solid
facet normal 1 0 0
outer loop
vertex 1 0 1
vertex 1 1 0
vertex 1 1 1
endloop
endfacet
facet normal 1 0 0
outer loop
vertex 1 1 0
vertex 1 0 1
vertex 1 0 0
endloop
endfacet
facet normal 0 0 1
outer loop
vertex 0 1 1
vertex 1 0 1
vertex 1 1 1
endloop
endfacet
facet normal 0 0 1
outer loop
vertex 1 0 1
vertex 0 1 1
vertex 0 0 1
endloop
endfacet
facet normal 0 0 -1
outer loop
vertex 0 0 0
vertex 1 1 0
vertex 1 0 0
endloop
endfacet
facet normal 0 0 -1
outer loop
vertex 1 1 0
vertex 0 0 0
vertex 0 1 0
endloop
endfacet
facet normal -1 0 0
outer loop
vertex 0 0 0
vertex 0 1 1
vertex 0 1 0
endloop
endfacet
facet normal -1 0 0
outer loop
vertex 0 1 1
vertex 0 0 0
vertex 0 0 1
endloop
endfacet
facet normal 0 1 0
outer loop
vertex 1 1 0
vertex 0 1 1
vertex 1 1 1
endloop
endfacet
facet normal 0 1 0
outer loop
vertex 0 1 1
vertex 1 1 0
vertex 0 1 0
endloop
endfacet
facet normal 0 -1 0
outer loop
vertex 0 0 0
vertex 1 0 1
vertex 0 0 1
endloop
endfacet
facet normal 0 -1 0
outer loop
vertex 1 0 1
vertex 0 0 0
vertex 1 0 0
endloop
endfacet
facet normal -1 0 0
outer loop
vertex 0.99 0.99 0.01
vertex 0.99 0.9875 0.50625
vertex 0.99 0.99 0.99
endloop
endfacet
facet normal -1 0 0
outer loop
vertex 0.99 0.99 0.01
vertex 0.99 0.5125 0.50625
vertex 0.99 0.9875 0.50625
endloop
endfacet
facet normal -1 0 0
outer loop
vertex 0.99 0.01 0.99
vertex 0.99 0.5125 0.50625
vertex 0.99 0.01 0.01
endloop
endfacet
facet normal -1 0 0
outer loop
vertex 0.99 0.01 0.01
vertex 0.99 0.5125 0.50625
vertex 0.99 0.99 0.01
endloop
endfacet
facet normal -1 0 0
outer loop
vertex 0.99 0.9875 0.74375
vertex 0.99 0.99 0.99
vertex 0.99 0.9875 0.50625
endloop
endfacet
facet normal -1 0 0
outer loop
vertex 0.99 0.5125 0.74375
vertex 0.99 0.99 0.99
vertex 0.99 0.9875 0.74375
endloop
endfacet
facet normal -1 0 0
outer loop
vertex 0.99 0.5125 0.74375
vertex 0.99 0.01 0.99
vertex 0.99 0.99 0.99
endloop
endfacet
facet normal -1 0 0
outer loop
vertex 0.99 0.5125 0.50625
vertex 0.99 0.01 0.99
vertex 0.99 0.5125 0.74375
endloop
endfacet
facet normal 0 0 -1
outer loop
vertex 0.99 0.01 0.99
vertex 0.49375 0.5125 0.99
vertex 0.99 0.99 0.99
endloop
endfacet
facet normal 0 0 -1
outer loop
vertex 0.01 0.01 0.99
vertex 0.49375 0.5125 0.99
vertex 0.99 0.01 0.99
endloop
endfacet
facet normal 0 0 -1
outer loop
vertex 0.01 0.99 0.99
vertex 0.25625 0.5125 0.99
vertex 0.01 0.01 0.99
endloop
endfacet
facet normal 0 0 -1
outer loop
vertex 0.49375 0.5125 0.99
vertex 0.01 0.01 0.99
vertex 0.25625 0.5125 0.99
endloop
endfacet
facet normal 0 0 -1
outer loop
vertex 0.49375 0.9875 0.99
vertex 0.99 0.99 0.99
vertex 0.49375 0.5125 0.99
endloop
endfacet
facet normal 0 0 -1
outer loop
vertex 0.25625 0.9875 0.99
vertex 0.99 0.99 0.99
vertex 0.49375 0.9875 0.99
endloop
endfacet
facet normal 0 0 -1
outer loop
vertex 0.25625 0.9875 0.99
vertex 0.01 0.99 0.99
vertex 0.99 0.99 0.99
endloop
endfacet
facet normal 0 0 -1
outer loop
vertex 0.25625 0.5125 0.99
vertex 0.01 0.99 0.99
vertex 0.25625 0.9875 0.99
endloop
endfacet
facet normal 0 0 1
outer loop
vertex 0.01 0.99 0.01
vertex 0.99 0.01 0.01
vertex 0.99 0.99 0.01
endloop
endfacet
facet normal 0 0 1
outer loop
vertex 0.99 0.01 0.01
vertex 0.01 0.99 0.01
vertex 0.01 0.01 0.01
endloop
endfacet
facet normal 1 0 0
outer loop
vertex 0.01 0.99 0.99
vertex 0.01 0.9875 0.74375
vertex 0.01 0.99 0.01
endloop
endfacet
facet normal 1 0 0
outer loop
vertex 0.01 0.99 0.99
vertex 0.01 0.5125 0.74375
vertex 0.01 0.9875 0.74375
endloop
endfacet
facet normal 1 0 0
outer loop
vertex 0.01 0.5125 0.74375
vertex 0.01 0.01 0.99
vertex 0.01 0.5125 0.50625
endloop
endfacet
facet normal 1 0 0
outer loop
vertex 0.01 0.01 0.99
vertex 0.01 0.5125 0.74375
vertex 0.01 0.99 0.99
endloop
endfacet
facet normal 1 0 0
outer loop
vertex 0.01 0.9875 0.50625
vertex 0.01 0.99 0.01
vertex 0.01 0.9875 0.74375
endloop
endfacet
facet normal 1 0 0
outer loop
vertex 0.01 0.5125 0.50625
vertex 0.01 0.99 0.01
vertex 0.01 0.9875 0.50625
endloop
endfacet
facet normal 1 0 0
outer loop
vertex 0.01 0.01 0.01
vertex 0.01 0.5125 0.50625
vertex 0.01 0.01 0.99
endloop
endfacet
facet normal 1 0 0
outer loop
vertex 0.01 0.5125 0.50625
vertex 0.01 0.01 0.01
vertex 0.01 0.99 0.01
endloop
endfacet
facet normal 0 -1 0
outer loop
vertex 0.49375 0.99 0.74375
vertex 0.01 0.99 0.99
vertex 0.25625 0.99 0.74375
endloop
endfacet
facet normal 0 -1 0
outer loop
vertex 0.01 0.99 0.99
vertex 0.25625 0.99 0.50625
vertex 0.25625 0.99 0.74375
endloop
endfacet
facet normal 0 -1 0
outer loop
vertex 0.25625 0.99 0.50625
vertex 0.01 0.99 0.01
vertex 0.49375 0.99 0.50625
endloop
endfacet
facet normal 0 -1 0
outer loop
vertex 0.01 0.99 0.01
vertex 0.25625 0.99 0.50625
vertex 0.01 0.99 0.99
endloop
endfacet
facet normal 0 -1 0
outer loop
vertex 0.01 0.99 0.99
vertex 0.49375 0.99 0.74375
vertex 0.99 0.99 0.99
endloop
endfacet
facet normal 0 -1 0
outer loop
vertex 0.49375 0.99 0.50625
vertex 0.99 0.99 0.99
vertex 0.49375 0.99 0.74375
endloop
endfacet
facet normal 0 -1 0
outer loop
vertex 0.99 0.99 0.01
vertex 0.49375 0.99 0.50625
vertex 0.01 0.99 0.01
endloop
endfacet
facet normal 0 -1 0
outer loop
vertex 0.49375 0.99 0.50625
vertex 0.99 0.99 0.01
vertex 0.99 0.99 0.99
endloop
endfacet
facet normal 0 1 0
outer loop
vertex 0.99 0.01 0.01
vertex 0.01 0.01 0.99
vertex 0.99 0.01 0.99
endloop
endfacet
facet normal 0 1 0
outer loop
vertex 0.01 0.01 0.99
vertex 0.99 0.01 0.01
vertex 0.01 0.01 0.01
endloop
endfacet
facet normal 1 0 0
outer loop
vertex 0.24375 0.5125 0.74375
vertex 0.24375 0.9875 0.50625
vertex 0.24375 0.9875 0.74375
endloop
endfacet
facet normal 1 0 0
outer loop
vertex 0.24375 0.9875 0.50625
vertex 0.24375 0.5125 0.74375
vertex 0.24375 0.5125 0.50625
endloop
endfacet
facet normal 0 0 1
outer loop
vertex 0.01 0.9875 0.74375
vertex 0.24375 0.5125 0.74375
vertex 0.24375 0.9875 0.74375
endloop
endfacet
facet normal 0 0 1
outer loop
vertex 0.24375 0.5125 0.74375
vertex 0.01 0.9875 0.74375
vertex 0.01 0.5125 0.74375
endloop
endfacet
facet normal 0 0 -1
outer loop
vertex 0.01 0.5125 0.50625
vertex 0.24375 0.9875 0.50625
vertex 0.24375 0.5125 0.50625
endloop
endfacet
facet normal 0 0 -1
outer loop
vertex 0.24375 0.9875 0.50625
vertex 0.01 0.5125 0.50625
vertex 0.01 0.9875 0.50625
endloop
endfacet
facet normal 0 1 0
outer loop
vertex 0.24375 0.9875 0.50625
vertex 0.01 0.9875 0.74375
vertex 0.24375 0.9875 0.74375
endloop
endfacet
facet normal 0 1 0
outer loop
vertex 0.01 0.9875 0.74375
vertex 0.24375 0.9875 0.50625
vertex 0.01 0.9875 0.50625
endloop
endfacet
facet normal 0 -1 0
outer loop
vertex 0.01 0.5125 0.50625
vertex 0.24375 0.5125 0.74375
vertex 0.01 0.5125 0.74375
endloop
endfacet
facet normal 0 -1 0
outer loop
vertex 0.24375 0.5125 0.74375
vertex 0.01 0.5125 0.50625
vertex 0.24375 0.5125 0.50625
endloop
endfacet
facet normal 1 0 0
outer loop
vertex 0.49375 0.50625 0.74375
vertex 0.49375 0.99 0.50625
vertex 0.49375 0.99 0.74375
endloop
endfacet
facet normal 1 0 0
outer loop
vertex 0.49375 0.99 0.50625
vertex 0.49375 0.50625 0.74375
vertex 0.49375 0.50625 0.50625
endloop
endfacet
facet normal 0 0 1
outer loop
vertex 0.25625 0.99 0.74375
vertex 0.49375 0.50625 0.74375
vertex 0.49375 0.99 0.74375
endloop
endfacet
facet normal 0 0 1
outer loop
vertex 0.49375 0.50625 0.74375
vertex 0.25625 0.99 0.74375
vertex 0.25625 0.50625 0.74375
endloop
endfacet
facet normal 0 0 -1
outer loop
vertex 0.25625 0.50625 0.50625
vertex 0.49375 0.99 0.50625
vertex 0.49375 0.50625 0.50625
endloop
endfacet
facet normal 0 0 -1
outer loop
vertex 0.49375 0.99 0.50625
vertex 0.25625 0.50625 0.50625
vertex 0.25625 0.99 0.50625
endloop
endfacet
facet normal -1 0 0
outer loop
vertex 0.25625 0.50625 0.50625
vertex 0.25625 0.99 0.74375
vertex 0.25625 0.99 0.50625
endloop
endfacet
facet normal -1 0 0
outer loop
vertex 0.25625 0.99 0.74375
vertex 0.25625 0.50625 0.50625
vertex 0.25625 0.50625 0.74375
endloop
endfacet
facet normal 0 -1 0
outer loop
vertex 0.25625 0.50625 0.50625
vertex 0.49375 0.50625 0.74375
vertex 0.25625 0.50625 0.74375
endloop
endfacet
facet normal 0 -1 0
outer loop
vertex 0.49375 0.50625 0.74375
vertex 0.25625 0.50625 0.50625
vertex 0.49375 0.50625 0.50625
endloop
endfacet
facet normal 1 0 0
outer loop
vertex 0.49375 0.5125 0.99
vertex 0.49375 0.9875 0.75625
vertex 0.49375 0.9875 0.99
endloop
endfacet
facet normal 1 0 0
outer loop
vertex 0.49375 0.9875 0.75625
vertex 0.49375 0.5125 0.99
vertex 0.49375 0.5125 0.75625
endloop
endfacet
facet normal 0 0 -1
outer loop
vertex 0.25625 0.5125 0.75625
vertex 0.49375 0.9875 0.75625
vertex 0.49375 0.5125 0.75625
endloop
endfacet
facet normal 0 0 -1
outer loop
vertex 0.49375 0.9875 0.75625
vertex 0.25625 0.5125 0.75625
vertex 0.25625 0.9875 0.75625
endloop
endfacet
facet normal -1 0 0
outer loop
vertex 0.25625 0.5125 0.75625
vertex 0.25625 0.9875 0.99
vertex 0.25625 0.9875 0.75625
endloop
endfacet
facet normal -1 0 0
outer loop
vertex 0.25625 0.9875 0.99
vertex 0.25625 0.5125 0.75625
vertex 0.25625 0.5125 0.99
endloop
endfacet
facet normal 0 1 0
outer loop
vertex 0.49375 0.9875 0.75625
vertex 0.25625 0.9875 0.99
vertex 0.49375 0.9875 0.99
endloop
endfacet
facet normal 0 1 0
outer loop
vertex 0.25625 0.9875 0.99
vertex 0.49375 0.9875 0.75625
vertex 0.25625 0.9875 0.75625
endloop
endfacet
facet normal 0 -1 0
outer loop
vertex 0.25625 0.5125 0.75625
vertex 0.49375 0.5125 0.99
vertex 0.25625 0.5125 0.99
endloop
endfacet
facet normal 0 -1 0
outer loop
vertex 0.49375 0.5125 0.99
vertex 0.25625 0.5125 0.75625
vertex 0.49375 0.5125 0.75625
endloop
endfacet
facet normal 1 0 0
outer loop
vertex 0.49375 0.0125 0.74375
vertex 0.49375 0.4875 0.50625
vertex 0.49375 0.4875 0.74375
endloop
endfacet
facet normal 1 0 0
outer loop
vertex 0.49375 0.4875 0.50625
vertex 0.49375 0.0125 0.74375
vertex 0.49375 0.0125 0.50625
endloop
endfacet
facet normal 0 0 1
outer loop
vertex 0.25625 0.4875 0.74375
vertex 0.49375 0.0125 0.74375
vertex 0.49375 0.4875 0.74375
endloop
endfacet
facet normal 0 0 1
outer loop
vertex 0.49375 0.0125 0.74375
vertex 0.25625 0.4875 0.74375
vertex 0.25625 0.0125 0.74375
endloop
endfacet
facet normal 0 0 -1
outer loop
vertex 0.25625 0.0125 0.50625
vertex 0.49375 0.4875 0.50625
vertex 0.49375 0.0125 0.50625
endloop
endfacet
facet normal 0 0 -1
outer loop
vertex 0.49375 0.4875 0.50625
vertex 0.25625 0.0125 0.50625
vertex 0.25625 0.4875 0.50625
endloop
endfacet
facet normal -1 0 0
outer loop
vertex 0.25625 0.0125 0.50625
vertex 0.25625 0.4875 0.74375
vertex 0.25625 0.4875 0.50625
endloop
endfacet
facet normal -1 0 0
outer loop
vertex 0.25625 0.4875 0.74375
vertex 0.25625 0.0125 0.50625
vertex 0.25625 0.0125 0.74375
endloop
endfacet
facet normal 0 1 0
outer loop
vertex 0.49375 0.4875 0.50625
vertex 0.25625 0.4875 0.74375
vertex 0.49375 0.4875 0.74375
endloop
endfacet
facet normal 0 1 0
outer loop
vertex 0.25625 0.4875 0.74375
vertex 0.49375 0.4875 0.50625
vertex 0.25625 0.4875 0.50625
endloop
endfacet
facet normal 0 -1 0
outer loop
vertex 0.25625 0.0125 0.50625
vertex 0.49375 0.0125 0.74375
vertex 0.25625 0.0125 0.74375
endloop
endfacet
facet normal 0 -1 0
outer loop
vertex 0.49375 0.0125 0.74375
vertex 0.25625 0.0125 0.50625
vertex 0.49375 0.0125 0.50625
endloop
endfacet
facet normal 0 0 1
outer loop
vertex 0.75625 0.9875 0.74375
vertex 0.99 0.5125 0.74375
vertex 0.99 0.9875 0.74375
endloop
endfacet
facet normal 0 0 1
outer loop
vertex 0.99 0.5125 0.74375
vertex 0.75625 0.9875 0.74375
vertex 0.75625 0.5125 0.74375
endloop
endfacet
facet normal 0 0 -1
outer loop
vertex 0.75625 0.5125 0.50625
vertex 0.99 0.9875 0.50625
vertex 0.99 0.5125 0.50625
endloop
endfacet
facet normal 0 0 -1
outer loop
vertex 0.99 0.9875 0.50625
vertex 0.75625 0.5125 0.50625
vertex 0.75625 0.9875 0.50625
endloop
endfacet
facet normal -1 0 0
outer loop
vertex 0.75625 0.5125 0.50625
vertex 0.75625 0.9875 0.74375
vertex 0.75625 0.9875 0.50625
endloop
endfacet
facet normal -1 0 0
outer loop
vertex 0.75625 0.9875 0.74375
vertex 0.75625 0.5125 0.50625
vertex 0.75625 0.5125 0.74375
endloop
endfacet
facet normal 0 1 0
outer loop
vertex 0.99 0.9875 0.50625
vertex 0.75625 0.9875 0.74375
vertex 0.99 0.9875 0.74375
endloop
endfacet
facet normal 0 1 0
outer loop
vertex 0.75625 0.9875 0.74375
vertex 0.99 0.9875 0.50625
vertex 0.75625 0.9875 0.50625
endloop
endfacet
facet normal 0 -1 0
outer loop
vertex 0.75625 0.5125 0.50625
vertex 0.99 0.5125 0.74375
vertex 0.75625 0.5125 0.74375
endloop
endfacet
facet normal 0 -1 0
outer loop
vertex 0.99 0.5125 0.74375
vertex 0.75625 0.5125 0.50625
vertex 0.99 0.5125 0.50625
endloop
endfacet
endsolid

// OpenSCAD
translate([0.125, 0.75, 0.625]) color([0.12810772743771714, 0.798813179036526, 0.10112610105346276]) cube([0.2375, 0.475, 0.2375], center=true);
translate([0.375, 0.625, 0.625]) color([0.5974375438561572, 0.8488323740985618, 0.15852232646816133]) cube([0.2375, 0.2375, 0.2375], center=true);
translate([0.375, 0.875, 0.625]) color([0.5978740169757398, 0.8681420391372784, 0.46112476133502645]) cube([0.2375, 0.2375, 0.2375], center=true);
translate([0.375, 0.75, 0.875]) color([0.6314514919010058, 0.19629053512755534, 0.834937066345738]) cube([0.2375, 0.475, 0.2375], center=true);
translate([0.375, 0.25, 0.625]) color([0.4009670746604762, 0.32173203192271393, 0.553082009505837]) cube([0.2375, 0.475, 0.2375], center=true);
translate([0.875, 0.75, 0.625]) color([0.3256937881953724, 0.9109963078438346, 0.13412178984042844]) cube([0.2375, 0.475, 0.2375], center=true);
translate([0.375, 0.75, 0.625]) color([0.16837589335630898, 0.8764134615484998, 0.07351501458473586]) cube([0.2375, 0.475, 0.2375], center=true);
color([0.3,0.3,0.3,0.3]) difference() { cube([1,1,1]); translate([0.01,0.01,0.01]) cube([0.98,0.98,0.98]); }
